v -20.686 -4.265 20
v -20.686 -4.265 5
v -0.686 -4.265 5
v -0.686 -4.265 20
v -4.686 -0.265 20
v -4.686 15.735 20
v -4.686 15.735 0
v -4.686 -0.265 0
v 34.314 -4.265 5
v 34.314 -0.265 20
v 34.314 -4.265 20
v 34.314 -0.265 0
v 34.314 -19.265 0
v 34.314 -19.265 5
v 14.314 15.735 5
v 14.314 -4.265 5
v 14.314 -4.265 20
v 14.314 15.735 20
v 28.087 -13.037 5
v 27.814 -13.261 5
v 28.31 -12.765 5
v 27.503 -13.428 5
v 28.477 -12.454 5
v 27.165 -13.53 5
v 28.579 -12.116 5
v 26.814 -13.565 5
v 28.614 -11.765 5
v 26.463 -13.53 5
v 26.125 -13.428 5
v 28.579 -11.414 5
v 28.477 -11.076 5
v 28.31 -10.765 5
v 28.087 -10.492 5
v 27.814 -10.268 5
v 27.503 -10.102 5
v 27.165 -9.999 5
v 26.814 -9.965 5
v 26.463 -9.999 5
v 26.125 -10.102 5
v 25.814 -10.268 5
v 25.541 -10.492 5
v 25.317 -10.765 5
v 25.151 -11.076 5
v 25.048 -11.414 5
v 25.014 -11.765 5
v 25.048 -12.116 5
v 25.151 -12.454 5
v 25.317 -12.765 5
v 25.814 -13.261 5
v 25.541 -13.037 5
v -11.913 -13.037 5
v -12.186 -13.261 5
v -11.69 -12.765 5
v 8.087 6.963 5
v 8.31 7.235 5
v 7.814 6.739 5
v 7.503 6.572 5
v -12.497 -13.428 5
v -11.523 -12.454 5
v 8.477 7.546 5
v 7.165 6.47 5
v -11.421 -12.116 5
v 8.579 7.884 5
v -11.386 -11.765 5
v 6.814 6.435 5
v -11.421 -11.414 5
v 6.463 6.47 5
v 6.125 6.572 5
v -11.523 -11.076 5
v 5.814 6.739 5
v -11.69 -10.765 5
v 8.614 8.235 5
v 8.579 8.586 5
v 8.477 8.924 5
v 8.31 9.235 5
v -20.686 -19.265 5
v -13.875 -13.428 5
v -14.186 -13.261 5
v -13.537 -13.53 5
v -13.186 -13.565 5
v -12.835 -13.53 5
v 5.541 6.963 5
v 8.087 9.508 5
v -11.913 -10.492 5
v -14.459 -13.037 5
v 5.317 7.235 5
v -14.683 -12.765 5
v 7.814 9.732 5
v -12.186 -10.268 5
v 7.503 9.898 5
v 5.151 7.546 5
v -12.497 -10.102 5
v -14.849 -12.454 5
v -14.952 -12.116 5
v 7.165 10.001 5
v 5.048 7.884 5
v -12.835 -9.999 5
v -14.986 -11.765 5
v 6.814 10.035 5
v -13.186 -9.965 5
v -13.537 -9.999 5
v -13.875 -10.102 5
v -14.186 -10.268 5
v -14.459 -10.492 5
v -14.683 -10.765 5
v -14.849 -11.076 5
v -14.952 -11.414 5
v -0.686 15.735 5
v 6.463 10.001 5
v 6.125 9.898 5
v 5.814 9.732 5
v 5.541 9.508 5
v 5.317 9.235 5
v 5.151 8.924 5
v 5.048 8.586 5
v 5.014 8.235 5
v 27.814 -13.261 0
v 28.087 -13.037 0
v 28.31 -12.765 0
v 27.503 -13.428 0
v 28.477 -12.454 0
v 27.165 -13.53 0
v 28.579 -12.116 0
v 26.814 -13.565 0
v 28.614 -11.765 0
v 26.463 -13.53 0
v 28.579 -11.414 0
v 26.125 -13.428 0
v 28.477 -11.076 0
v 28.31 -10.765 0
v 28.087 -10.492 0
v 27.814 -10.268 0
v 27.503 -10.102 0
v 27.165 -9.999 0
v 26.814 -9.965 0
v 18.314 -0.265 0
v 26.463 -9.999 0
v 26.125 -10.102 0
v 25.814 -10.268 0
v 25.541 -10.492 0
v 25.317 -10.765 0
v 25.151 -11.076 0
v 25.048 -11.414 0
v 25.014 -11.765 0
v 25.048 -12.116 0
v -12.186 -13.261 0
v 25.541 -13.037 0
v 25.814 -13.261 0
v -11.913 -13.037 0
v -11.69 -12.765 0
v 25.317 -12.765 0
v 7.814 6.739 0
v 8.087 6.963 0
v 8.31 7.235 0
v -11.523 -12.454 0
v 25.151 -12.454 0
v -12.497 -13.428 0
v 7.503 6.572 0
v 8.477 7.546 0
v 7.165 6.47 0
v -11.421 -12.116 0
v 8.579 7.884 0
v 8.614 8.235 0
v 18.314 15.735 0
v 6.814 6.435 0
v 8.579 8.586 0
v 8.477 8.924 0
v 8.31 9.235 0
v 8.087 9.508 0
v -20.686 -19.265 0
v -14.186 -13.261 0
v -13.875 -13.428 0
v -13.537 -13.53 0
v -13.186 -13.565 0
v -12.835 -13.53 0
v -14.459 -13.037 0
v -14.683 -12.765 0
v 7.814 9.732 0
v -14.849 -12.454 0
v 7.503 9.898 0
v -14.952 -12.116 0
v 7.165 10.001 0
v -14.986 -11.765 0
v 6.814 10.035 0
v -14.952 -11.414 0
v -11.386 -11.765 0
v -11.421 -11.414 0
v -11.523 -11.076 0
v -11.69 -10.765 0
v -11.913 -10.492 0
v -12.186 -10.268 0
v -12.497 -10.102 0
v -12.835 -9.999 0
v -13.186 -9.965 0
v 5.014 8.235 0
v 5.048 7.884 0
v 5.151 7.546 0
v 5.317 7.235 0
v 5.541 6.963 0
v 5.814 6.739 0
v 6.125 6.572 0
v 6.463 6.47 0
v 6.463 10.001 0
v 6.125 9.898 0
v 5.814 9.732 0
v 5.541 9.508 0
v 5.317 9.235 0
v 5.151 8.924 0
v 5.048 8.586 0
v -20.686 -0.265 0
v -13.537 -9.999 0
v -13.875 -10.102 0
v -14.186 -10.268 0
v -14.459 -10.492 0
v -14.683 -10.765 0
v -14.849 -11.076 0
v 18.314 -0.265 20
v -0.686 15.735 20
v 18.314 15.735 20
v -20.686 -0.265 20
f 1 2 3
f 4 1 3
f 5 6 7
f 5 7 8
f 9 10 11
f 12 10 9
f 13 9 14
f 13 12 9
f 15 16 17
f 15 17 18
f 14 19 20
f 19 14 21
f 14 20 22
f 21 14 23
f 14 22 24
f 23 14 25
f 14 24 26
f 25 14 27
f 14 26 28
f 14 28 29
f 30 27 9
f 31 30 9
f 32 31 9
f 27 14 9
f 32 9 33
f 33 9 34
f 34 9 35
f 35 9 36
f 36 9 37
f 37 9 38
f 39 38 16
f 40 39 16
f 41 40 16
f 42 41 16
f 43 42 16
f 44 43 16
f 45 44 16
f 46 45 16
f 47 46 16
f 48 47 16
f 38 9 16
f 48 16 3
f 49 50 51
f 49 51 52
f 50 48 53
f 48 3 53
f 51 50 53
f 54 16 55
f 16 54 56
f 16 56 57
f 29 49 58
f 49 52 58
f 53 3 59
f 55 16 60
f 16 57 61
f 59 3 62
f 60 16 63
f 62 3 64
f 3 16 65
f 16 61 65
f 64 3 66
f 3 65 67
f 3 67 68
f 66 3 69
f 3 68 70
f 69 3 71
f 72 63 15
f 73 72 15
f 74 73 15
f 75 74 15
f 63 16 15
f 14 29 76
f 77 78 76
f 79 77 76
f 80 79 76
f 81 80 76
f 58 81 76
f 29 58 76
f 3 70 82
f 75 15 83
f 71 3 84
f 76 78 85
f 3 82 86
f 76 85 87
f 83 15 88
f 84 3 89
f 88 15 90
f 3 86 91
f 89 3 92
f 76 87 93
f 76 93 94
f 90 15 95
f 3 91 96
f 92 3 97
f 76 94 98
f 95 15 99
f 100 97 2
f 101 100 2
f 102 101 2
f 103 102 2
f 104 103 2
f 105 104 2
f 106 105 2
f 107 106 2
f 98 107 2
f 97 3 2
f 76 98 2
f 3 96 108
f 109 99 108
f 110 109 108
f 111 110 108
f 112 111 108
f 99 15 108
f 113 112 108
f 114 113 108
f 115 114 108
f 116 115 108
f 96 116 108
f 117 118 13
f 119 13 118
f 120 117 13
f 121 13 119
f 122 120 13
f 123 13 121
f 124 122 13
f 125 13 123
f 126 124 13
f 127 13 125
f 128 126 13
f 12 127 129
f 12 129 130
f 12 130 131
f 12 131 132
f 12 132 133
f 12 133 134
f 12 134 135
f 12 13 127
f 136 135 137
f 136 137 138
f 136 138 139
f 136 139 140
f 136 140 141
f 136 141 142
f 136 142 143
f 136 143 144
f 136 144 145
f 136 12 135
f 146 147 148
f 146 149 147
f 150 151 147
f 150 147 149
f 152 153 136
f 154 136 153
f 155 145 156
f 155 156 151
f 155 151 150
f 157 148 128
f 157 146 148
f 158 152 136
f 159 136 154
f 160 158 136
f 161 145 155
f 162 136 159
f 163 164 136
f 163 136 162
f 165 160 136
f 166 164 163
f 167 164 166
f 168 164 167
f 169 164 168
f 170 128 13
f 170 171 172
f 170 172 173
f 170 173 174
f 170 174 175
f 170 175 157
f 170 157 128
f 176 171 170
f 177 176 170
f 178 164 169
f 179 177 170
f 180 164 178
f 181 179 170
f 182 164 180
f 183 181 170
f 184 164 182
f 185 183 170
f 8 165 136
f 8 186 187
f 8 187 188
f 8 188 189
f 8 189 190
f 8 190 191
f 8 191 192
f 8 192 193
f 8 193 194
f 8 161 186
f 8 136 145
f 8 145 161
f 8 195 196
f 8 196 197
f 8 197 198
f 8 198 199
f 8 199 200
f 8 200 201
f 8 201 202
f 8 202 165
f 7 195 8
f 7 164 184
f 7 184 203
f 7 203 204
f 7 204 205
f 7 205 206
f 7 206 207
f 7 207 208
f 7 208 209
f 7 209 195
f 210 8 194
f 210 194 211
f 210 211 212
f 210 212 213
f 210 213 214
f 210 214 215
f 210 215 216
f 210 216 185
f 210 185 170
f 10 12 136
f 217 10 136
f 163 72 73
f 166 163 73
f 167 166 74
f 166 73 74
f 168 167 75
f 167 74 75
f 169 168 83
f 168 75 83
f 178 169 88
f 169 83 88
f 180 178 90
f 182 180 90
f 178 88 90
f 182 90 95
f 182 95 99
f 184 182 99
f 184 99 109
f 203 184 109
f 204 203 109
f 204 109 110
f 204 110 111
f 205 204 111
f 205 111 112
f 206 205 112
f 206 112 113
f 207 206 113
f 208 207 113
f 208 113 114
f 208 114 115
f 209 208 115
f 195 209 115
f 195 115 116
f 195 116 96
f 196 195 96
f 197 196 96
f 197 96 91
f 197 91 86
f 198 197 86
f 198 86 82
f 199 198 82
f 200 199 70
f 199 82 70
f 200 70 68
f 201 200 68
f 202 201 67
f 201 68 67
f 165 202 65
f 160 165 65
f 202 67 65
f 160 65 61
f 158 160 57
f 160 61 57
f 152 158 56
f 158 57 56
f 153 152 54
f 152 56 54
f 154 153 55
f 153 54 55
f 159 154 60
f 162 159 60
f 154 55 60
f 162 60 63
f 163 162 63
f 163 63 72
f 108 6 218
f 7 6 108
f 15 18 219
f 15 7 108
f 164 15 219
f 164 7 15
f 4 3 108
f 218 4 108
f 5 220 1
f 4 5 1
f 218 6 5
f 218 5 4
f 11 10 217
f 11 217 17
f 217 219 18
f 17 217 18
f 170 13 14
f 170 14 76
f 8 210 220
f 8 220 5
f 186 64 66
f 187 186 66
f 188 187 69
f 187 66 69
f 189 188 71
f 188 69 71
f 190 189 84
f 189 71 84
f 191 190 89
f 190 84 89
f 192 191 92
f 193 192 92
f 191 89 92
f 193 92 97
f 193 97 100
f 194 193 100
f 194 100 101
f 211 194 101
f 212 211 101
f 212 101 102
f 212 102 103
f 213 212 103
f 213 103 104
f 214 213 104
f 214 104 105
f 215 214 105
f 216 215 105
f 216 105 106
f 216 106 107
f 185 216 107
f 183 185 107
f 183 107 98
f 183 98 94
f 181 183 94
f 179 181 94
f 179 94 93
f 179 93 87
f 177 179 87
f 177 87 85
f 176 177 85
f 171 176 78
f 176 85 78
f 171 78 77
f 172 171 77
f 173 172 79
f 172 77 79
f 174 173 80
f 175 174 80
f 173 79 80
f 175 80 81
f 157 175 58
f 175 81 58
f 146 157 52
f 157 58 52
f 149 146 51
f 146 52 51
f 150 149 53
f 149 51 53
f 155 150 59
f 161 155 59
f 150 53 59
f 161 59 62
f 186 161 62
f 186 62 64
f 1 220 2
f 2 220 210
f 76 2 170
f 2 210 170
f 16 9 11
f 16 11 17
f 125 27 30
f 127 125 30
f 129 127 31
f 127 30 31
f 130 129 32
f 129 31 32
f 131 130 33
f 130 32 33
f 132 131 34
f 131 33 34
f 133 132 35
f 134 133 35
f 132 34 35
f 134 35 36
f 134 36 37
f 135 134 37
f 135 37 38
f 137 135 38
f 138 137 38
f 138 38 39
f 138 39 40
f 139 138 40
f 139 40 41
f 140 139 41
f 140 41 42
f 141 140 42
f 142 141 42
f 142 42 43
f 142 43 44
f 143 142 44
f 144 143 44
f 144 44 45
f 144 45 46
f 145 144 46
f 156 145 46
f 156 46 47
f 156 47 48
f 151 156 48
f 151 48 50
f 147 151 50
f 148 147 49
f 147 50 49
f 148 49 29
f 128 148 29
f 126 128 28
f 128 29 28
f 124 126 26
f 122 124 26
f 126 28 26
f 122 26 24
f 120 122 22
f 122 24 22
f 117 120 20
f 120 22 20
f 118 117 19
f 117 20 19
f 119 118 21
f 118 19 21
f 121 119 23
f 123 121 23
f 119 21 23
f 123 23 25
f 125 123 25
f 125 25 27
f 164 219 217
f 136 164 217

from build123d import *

# Parameters (mm, degrees)
BOSS_EXTRUDE1_DEPTH = 5
BOSS_EXTRUDE2_DEPTH = 20
SKETCH6_R           = 1.8
CUT_EXTRUDE3_DEPTH  = 6


with BuildPart() as part:
    # Sketch1 → Boss-Extrude1 (new body)
    with BuildSketch(Plane.XY):
        Polygon((14.31372549, -4.264705882), (34.31372549, -4.264705882), (34.31372549, -19.264705882), (-20.68627451, -19.264705882), (-20.68627451, -4.264705882), (-0.68627451, -4.264705882), (-0.68627451, 15.735294118), (14.31372549, 15.735294118), align=None)
    extrude(amount=BOSS_EXTRUDE1_DEPTH)

    # Sketch2 → Boss-Extrude2 (add)
    with BuildSketch(Plane(origin=(0, 0, 0), x_dir=(-1, 0, 0), z_dir=(0, 0, -1))):
        Polygon((0.68627451, 15.735294118), (4.68627451, 15.735294118), (4.68627451, -0.264705882), (6.079970528, -0.264705882), (20.68627451, -0.264705882), (20.68627451, -4.264705882), (0.68627451, -4.264705882), align=None)
    boss_extrude2 = extrude(amount=-BOSS_EXTRUDE2_DEPTH)

    # Mirror1: Boss-Extrude2 across plane
    add(boss_extrude2.mirror(Plane.ZY.offset(-6.81372549)))

    # Sketch6 → Cut-Extrude3 (cut, through all)
    with BuildSketch(Plane.XY.offset(5)):
        with Locations((6.81372549, 8.235294118)):
            Circle(SKETCH6_R)
        with Locations((-13.18627451, -11.764705882)):
            Circle(SKETCH6_R)
        with Locations((26.81372549, -11.764705882)):
            Circle(SKETCH6_R)
    extrude(amount=-CUT_EXTRUDE3_DEPTH, mode=Mode.SUBTRACT)


solid = part.part
